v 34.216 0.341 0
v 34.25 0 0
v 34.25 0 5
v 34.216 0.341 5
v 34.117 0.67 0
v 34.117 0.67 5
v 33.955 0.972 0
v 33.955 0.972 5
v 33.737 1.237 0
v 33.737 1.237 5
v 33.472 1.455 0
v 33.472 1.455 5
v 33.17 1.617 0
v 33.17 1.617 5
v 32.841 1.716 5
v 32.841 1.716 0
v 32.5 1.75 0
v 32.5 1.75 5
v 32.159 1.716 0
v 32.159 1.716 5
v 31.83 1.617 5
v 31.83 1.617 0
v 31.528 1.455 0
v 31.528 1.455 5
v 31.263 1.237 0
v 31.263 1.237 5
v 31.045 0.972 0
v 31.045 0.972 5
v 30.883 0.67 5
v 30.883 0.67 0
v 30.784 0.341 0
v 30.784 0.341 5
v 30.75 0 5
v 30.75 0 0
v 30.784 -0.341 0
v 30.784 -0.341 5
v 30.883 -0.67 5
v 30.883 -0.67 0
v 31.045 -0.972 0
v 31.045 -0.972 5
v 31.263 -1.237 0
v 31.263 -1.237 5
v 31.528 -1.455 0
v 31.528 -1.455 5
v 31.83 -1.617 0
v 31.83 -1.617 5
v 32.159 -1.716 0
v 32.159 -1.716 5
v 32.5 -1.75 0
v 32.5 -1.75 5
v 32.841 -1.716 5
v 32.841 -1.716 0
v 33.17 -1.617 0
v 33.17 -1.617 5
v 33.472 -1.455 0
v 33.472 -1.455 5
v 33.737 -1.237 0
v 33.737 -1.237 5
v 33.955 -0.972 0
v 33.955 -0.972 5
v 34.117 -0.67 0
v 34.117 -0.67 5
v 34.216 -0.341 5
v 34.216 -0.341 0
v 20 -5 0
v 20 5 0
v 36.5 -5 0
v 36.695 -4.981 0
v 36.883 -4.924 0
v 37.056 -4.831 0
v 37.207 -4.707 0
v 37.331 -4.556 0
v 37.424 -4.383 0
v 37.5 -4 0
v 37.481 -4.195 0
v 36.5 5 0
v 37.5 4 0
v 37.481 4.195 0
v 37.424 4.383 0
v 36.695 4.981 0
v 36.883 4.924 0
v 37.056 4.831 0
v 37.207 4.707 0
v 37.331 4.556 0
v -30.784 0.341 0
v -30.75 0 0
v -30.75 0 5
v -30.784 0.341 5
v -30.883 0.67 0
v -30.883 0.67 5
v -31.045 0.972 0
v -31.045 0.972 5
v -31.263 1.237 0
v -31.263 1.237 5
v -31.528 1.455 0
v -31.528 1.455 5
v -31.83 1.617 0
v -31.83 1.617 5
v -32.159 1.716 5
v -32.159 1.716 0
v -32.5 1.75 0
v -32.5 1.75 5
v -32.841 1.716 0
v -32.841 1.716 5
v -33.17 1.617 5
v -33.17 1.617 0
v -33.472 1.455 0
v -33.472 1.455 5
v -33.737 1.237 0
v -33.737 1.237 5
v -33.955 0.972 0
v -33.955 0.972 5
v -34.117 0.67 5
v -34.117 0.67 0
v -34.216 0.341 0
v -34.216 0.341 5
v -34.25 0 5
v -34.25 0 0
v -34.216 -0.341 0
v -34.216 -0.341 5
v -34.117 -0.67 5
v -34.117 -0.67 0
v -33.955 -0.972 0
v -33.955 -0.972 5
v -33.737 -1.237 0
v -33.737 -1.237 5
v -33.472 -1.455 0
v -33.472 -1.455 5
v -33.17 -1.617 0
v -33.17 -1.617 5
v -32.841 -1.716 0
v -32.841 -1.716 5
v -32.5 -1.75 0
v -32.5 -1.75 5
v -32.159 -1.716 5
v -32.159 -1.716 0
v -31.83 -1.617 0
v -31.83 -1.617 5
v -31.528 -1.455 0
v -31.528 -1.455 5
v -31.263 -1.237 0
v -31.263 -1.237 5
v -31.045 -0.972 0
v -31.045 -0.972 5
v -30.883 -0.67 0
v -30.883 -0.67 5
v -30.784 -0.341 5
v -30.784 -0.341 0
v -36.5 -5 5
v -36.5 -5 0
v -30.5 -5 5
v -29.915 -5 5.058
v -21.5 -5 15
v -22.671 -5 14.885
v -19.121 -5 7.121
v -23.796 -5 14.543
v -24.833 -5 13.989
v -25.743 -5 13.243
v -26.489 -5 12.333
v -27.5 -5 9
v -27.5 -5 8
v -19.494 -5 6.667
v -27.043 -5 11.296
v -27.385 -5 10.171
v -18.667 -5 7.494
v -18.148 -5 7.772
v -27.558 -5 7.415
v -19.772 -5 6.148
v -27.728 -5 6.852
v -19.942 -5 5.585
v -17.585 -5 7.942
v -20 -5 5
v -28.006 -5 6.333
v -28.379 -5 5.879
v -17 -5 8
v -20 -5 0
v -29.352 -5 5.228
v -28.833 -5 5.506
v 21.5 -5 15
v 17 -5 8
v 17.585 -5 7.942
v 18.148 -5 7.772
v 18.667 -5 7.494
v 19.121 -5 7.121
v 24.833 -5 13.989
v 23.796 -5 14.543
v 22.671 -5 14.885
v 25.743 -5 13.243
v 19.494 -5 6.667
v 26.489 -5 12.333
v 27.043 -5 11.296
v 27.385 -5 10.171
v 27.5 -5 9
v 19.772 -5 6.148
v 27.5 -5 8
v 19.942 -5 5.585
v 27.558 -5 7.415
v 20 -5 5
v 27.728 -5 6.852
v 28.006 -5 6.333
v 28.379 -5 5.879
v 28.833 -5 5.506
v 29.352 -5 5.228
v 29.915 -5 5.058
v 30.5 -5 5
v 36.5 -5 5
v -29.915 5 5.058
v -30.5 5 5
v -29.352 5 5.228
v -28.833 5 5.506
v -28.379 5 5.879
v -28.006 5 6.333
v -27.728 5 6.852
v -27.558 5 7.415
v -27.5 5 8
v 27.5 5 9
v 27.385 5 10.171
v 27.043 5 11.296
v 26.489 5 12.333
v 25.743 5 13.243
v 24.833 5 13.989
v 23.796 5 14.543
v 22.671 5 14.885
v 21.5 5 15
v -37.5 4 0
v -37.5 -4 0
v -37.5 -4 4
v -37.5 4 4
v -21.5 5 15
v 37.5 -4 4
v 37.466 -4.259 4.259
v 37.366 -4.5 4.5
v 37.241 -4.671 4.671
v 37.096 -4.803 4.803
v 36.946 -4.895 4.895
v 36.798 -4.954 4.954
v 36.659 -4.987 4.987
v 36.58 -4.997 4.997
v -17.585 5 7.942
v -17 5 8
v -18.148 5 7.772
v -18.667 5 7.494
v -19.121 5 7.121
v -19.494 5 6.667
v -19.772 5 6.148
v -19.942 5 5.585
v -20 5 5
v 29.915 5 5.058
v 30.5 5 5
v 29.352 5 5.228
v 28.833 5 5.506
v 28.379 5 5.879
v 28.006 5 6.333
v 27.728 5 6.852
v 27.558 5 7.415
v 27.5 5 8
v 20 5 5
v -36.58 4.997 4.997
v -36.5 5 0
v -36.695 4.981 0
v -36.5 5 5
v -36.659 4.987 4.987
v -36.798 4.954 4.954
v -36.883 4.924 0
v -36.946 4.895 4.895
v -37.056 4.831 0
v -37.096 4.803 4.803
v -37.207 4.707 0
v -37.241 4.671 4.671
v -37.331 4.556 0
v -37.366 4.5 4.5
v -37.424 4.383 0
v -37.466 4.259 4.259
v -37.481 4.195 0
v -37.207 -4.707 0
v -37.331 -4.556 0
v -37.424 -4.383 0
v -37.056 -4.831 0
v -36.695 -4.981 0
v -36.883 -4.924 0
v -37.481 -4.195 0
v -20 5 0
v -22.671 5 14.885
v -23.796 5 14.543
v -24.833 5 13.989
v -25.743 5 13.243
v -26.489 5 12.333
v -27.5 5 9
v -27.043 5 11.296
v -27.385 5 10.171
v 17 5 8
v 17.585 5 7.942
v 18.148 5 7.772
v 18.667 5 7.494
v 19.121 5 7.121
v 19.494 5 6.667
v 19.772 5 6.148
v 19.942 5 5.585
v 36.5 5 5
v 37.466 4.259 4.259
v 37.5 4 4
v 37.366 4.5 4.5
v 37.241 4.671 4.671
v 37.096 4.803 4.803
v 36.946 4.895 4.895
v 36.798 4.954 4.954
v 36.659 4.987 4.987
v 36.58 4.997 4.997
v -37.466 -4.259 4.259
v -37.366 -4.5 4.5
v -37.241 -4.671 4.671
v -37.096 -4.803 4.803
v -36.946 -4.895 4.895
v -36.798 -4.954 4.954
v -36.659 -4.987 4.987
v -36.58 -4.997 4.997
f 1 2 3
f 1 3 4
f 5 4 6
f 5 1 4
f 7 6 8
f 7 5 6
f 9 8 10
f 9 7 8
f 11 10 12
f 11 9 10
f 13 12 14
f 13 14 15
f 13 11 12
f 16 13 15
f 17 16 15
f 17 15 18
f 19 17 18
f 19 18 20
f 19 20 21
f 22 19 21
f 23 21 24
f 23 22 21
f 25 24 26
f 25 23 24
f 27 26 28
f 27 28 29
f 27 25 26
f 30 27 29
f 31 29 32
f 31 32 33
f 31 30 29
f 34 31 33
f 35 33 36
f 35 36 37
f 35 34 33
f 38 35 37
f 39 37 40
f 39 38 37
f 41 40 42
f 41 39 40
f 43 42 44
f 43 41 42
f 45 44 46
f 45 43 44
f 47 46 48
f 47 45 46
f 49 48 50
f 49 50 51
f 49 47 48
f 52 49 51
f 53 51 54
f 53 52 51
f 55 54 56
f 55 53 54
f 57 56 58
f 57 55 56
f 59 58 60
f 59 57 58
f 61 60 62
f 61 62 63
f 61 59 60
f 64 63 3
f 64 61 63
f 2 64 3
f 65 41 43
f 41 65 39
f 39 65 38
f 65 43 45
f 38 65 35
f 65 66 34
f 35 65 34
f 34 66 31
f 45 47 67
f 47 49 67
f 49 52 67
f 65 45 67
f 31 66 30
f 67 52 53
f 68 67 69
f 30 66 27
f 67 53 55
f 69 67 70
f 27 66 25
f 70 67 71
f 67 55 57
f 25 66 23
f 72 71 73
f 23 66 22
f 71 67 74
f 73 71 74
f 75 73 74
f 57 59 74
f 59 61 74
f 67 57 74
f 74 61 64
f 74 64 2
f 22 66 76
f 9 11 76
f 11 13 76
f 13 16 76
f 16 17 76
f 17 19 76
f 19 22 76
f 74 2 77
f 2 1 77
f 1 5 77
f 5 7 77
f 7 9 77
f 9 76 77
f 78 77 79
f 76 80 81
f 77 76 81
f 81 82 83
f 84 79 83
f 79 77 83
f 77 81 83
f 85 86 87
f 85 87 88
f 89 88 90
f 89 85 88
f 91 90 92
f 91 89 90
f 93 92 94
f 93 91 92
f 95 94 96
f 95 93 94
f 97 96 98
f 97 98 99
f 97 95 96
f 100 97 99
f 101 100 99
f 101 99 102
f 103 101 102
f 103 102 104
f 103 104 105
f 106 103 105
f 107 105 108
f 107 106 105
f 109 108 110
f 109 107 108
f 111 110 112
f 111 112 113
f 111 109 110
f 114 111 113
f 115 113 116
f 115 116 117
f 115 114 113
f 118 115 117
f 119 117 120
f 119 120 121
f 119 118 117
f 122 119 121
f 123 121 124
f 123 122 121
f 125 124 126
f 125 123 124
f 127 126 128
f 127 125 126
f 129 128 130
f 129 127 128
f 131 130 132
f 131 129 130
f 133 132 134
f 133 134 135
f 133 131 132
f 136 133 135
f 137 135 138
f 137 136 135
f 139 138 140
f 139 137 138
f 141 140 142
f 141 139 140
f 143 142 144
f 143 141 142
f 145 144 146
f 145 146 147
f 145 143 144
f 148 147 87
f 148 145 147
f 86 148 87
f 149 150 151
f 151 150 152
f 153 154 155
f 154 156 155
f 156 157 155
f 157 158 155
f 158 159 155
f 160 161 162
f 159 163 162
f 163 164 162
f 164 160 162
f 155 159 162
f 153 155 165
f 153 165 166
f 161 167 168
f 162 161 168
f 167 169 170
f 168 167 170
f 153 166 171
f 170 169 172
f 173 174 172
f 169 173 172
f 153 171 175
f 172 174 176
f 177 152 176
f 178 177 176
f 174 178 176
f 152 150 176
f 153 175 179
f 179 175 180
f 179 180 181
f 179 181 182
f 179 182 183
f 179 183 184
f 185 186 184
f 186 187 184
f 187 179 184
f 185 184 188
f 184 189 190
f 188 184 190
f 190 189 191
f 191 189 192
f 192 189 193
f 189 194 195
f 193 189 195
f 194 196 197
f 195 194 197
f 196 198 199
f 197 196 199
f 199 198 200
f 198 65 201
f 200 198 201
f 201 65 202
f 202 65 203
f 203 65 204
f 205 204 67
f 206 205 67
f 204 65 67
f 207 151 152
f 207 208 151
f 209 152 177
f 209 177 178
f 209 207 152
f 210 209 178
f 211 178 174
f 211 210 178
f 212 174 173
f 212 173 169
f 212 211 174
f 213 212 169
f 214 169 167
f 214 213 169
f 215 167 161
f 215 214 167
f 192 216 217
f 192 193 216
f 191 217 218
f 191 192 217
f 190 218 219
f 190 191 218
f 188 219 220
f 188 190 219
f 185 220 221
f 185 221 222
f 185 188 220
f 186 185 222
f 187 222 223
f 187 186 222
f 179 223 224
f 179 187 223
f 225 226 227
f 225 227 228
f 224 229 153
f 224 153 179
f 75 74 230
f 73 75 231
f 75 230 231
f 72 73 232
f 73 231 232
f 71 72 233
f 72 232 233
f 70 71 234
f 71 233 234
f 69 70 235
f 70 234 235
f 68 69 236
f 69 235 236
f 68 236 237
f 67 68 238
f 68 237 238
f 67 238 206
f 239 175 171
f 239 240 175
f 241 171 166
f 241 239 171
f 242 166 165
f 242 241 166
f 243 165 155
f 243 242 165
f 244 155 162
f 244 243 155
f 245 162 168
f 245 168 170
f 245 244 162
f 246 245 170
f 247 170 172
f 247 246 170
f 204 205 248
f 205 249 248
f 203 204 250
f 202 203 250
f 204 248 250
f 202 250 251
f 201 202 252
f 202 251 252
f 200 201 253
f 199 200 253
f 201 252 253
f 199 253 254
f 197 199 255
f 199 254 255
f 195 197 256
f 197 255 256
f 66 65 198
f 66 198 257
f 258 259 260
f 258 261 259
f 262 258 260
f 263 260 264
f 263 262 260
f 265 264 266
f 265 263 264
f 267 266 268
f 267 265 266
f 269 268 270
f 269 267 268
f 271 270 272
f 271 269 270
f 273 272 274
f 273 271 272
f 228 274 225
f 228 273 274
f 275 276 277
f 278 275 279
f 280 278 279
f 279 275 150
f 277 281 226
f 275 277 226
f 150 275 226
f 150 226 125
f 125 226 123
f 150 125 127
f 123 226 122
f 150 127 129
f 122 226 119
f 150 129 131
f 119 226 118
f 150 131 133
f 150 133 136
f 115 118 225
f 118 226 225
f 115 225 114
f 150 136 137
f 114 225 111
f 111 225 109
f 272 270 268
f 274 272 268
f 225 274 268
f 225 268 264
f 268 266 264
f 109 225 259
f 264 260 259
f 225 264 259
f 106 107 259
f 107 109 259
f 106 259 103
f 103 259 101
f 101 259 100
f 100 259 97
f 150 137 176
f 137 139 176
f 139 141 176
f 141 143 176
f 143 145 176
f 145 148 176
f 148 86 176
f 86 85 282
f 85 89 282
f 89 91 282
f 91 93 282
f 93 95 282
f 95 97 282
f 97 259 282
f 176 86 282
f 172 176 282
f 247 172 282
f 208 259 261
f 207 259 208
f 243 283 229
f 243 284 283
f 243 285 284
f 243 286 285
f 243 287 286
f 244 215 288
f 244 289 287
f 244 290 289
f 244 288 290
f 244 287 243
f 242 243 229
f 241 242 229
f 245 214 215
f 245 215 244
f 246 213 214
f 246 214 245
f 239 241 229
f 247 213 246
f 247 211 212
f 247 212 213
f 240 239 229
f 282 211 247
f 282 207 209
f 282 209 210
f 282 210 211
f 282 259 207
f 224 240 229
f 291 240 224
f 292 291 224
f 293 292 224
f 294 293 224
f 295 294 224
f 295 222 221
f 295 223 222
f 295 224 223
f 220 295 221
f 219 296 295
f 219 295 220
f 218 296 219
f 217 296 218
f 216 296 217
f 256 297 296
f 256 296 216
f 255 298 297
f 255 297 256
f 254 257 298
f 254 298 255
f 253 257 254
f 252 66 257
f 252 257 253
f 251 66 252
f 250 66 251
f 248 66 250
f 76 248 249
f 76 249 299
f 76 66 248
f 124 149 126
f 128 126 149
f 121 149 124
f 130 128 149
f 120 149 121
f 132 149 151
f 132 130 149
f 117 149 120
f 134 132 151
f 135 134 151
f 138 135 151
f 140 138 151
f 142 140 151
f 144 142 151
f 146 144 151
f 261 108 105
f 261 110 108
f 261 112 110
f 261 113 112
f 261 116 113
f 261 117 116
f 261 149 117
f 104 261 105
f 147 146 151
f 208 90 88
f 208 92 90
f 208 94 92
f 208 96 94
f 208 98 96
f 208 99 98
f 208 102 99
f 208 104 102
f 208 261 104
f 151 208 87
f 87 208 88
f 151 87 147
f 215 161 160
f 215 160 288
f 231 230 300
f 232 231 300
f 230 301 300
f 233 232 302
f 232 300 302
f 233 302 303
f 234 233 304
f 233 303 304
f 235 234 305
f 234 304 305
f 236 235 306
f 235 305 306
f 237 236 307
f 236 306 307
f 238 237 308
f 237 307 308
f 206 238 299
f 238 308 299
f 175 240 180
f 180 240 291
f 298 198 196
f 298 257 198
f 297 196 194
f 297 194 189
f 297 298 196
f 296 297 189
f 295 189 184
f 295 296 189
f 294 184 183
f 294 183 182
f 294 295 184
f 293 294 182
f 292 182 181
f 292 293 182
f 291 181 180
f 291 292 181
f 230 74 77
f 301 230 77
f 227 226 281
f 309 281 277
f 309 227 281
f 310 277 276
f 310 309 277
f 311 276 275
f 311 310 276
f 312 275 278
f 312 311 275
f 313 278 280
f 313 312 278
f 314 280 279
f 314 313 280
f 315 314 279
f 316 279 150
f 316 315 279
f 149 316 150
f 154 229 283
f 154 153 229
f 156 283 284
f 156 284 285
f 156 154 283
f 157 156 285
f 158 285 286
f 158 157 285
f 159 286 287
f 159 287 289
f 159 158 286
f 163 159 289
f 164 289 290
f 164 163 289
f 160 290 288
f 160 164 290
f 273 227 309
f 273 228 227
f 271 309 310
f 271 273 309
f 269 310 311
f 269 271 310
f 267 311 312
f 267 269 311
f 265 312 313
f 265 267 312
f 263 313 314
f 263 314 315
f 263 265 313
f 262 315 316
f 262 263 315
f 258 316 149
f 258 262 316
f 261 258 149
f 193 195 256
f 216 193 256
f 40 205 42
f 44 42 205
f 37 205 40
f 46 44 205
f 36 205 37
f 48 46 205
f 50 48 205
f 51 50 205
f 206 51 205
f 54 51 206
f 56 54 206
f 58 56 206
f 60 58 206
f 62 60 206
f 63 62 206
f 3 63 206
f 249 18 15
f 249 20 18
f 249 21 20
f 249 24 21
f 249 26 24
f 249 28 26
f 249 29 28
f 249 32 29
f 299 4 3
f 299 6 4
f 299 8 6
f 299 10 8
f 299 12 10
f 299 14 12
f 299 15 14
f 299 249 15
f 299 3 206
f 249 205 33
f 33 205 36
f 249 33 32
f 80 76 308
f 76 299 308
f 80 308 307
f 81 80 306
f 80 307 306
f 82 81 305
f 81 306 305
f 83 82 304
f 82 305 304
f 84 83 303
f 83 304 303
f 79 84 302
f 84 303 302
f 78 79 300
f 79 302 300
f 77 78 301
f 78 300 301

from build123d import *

# Parameters (mm, degrees)
SKETCH_W        = 75
SKETCH_H        = 10
PAD_DEPTH       = 15
SKETCH001_W     = 10
SKETCH001_H     = 10
POCKET_DEPTH    = 25
SKETCH002_R     = 1.75
POCKET001_DEPTH = 5
SKETCH003_W     = 40
SKETCH003_H     = 10
POCKET002_DEPTH = 8
FILLET_R        = 3
FILLET001_R     = 6
FILLET002_R     = 3
FILLET003_R     = 1


with BuildPart() as part:
    # Sketch → Pad (new body)
    with BuildSketch(Plane.XY):
        Rectangle(SKETCH_W, SKETCH_H)
    extrude(amount=PAD_DEPTH)

    # Sketch001 → Pocket (cut)
    with BuildSketch(Plane.XY.offset(5)):
        with Locations((-32.5, 0)):
            Rectangle(SKETCH001_W, SKETCH001_H)
        with Locations((32.5, 0)):
            Rectangle(SKETCH001_W, SKETCH001_H)
    extrude(amount=POCKET_DEPTH, mode=Mode.SUBTRACT)

    # Sketch002 → Pocket001 (cut)
    with BuildSketch(Plane.XY):
        with Locations((-32.5, 0)):
            Circle(SKETCH002_R)
        with Locations((32.5, 0)):
            Circle(SKETCH002_R)
    extrude(amount=POCKET001_DEPTH, mode=Mode.SUBTRACT)

    # Sketch003 → Pocket002 (cut)
    with BuildSketch(Plane.XY):
        Rectangle(SKETCH003_W, SKETCH003_H)
    extrude(amount=POCKET002_DEPTH, mode=Mode.SUBTRACT)

    # Fillet
    fillet_edges = [part.edges().sort_by_distance(p)[0] for p in [
        (-27.5, 0, 5),
        (27.5, 0, 5),
    ]]
    fillet(fillet_edges, radius=FILLET_R)

    # Fillet001
    fillet001_edges = [part.edges().sort_by_distance(p)[0] for p in [
        (-27.5, 0, 15),
        (27.5, 0, 15),
    ]]
    fillet(fillet001_edges, radius=FILLET001_R)

    # Fillet002
    fillet002_edges = [part.edges().sort_by_distance(p)[0] for p in [
        (-20, 0, 8),
        (20, 0, 8),
    ]]
    fillet(fillet002_edges, radius=FILLET002_R)

    # Fillet003
    fillet003_edges = [part.edges().sort_by_distance(p)[0] for p in [
        (-37.5, 0, 5),
        (-37.5, -5, 2.5),
        (-37.5, 5, 2.5),
        (37.5, -5, 2.5),
        (37.5, 0, 5),
        (37.5, 5, 2.5),
    ]]
    fillet(fillet003_edges, radius=FILLET003_R)


solid = part.part
